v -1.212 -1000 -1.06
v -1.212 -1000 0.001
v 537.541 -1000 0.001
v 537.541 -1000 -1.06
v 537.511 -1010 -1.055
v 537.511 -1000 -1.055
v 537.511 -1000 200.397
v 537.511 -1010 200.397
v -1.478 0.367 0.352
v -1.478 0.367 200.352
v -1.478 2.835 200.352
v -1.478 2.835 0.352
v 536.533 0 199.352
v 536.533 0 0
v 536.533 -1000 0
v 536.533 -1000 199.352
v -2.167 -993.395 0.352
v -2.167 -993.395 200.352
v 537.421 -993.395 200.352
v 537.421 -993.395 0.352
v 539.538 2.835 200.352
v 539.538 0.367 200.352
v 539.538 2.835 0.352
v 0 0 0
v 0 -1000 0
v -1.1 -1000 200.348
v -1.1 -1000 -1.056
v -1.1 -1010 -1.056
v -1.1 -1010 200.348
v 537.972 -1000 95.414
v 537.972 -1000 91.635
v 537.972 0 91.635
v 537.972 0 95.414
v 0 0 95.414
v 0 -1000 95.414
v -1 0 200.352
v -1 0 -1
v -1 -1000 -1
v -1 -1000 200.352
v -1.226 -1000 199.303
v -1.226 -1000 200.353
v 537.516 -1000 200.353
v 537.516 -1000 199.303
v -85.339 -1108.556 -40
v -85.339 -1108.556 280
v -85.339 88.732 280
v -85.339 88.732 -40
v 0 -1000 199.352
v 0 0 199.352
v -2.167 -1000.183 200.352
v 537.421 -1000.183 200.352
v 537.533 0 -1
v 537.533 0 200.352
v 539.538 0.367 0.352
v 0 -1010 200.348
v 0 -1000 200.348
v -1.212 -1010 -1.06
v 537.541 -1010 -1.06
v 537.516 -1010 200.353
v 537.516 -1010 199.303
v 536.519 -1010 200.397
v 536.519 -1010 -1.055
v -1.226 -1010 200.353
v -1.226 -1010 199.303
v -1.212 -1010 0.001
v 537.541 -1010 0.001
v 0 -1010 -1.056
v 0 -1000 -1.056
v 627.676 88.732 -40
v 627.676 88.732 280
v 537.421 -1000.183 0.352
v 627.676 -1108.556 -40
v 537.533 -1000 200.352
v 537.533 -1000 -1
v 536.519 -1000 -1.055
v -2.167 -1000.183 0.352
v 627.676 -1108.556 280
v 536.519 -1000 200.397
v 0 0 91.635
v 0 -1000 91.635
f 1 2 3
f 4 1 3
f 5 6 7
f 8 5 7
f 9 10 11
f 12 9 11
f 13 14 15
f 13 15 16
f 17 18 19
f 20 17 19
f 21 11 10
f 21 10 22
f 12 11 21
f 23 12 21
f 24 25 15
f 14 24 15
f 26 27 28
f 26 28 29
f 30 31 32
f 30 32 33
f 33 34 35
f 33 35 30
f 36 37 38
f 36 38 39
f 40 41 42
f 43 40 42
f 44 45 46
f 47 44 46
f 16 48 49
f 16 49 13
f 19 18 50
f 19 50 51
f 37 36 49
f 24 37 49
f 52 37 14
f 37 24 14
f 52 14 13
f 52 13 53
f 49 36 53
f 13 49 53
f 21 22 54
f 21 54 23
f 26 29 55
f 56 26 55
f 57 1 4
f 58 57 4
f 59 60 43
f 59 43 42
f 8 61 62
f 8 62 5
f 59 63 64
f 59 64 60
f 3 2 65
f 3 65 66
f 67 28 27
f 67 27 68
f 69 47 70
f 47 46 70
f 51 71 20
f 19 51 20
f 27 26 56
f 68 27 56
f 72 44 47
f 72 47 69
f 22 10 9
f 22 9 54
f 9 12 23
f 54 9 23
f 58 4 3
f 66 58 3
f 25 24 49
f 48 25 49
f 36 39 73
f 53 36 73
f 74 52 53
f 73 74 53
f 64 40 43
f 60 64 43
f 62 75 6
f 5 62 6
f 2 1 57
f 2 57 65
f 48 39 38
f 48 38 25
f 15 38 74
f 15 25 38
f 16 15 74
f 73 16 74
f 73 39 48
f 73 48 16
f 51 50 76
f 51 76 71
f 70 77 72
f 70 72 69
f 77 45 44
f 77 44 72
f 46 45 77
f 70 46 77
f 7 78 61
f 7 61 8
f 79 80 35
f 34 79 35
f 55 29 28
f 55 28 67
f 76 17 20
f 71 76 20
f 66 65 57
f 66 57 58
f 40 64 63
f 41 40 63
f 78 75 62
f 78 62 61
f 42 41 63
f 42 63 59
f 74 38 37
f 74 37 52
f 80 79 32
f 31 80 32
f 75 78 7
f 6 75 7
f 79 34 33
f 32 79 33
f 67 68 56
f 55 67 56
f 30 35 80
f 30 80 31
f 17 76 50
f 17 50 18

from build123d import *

# Parameters (mm, degrees)
SKETCH_W         = 538.533017
SKETCH_H         = 201.352429
SKETCH_W_2       = 536.533017
SKETCH_H_2       = 199.352429
EXTRUDE_DEPTH    = 1000
SKETCH003_W      = 541.015218
SKETCH003_H      = 2.468055
EXTRUDE003_DEPTH = 200
SKETCH004_W      = 539.587529
SKETCH004_H      = 6.787689
EXTRUDE004_DEPTH = 200
SKETCH005_W      = 1.100233
SKETCH005_H      = 201.404207
EXTRUDE005_DEPTH = 10
SKETCH006_W      = 0.992309
SKETCH006_H      = 201.451226
EXTRUDE006_DEPTH = 10
SKETCH007_W      = 538.741766
SKETCH007_H      = 1.050324
EXTRUDE007_DEPTH = 10
SKETCH008_W      = 538.753248
SKETCH008_H      = 1.060631
EXTRUDE008_DEPTH = 10
SKETCH009_W      = 537.97168
SKETCH009_H      = 3.779853
EXTRUDE009_DEPTH = 1000
SKETCH010_W      = 713.015061
SKETCH010_H      = 1197.288452
EXTRUDE010_DEPTH = 160


with BuildPart() as waveguide:
    # Sketch → Extrude (new body)
    with BuildSketch(Plane.XZ):
        with Locations((268.266508, 99.676215)):
            Rectangle(SKETCH_W, SKETCH_H)
        with Locations((268.266508, 99.676215)):
            Rectangle(SKETCH_W_2, SKETCH_H_2, mode=Mode.SUBTRACT)
    extrude(amount=EXTRUDE_DEPTH)


with BuildPart() as portout:
    # Sketch003 (on Face3 of Extrude) → Extrude003 (new body)
    with BuildSketch(Plane.XY.offset(200.352429)):
        with Locations((269.029928, 1.601028)):
            Rectangle(SKETCH003_W, SKETCH003_H)
    extrude(amount=-EXTRUDE003_DEPTH)


with BuildPart() as portin:
    # Sketch004 (on Face3 of Extrude) → Extrude004 (new body)
    with BuildSketch(Plane.XY.offset(200.352429)):
        with Locations((267.627194, -396.789047)):
            Rectangle(SKETCH004_W, SKETCH004_H)
    extrude(amount=-EXTRUDE004_DEPTH)


with BuildPart() as portin_1:
    # Extrude004 placement: moved
    add(portin.part.moved(Location((0, -600, 0))))


with BuildPart() as extrude005:
    # Sketch005 (on Face10 of Extrude) → Extrude005 (new body)
    with BuildSketch(Plane.XZ.offset(1000)):
        with Locations((-0.550117, 99.645705)):
            Rectangle(SKETCH005_W, SKETCH005_H)
    extrude(amount=EXTRUDE005_DEPTH)


with BuildPart() as extrude006:
    # Sketch006 (on Face10 of Extrude) → Extrude006 (new body)
    with BuildSketch(Plane.XZ.offset(1000)):
        with Locations((537.014892, 99.670932)):
            Rectangle(SKETCH006_W, SKETCH006_H)
    extrude(amount=EXTRUDE006_DEPTH)


with BuildPart() as extrude007:
    # Sketch007 (on Face10 of Extrude) → Extrude007 (new body)
    with BuildSketch(Plane.XZ.offset(1000)):
        with Locations((268.144925, 199.828125)):
            Rectangle(SKETCH007_W, SKETCH007_H)
    extrude(amount=EXTRUDE007_DEPTH)


with BuildPart() as extrude008:
    # Sketch008 (on Face10 of Extrude) → Extrude008 (new body)
    with BuildSketch(Plane.XZ.offset(1000)):
        with Locations((268.164147, -0.529333)):
            Rectangle(SKETCH008_W, SKETCH008_H)
    extrude(amount=EXTRUDE008_DEPTH)


with BuildPart() as electric_field:
    # Sketch009 → Extrude009 (new body)
    with BuildSketch(Plane.XZ):
        with Locations((268.98584, 93.524547)):
            Rectangle(SKETCH009_W, SKETCH009_H)
    extrude(amount=EXTRUDE009_DEPTH)


with BuildPart() as air_box:
    # Sketch010 → Extrude010 (new body, symmetric)
    with BuildSketch(Plane.XY.offset(120)):
        with Locations((271.1688, -509.91217)):
            Rectangle(SKETCH010_W, SKETCH010_H)
    extrude(amount=EXTRUDE010_DEPTH, both=True)


solid = Compound([waveguide.part, portout.part, portin_1.part, extrude005.part, extrude006.part, extrude007.part, extrude008.part, electric_field.part, air_box.part])
